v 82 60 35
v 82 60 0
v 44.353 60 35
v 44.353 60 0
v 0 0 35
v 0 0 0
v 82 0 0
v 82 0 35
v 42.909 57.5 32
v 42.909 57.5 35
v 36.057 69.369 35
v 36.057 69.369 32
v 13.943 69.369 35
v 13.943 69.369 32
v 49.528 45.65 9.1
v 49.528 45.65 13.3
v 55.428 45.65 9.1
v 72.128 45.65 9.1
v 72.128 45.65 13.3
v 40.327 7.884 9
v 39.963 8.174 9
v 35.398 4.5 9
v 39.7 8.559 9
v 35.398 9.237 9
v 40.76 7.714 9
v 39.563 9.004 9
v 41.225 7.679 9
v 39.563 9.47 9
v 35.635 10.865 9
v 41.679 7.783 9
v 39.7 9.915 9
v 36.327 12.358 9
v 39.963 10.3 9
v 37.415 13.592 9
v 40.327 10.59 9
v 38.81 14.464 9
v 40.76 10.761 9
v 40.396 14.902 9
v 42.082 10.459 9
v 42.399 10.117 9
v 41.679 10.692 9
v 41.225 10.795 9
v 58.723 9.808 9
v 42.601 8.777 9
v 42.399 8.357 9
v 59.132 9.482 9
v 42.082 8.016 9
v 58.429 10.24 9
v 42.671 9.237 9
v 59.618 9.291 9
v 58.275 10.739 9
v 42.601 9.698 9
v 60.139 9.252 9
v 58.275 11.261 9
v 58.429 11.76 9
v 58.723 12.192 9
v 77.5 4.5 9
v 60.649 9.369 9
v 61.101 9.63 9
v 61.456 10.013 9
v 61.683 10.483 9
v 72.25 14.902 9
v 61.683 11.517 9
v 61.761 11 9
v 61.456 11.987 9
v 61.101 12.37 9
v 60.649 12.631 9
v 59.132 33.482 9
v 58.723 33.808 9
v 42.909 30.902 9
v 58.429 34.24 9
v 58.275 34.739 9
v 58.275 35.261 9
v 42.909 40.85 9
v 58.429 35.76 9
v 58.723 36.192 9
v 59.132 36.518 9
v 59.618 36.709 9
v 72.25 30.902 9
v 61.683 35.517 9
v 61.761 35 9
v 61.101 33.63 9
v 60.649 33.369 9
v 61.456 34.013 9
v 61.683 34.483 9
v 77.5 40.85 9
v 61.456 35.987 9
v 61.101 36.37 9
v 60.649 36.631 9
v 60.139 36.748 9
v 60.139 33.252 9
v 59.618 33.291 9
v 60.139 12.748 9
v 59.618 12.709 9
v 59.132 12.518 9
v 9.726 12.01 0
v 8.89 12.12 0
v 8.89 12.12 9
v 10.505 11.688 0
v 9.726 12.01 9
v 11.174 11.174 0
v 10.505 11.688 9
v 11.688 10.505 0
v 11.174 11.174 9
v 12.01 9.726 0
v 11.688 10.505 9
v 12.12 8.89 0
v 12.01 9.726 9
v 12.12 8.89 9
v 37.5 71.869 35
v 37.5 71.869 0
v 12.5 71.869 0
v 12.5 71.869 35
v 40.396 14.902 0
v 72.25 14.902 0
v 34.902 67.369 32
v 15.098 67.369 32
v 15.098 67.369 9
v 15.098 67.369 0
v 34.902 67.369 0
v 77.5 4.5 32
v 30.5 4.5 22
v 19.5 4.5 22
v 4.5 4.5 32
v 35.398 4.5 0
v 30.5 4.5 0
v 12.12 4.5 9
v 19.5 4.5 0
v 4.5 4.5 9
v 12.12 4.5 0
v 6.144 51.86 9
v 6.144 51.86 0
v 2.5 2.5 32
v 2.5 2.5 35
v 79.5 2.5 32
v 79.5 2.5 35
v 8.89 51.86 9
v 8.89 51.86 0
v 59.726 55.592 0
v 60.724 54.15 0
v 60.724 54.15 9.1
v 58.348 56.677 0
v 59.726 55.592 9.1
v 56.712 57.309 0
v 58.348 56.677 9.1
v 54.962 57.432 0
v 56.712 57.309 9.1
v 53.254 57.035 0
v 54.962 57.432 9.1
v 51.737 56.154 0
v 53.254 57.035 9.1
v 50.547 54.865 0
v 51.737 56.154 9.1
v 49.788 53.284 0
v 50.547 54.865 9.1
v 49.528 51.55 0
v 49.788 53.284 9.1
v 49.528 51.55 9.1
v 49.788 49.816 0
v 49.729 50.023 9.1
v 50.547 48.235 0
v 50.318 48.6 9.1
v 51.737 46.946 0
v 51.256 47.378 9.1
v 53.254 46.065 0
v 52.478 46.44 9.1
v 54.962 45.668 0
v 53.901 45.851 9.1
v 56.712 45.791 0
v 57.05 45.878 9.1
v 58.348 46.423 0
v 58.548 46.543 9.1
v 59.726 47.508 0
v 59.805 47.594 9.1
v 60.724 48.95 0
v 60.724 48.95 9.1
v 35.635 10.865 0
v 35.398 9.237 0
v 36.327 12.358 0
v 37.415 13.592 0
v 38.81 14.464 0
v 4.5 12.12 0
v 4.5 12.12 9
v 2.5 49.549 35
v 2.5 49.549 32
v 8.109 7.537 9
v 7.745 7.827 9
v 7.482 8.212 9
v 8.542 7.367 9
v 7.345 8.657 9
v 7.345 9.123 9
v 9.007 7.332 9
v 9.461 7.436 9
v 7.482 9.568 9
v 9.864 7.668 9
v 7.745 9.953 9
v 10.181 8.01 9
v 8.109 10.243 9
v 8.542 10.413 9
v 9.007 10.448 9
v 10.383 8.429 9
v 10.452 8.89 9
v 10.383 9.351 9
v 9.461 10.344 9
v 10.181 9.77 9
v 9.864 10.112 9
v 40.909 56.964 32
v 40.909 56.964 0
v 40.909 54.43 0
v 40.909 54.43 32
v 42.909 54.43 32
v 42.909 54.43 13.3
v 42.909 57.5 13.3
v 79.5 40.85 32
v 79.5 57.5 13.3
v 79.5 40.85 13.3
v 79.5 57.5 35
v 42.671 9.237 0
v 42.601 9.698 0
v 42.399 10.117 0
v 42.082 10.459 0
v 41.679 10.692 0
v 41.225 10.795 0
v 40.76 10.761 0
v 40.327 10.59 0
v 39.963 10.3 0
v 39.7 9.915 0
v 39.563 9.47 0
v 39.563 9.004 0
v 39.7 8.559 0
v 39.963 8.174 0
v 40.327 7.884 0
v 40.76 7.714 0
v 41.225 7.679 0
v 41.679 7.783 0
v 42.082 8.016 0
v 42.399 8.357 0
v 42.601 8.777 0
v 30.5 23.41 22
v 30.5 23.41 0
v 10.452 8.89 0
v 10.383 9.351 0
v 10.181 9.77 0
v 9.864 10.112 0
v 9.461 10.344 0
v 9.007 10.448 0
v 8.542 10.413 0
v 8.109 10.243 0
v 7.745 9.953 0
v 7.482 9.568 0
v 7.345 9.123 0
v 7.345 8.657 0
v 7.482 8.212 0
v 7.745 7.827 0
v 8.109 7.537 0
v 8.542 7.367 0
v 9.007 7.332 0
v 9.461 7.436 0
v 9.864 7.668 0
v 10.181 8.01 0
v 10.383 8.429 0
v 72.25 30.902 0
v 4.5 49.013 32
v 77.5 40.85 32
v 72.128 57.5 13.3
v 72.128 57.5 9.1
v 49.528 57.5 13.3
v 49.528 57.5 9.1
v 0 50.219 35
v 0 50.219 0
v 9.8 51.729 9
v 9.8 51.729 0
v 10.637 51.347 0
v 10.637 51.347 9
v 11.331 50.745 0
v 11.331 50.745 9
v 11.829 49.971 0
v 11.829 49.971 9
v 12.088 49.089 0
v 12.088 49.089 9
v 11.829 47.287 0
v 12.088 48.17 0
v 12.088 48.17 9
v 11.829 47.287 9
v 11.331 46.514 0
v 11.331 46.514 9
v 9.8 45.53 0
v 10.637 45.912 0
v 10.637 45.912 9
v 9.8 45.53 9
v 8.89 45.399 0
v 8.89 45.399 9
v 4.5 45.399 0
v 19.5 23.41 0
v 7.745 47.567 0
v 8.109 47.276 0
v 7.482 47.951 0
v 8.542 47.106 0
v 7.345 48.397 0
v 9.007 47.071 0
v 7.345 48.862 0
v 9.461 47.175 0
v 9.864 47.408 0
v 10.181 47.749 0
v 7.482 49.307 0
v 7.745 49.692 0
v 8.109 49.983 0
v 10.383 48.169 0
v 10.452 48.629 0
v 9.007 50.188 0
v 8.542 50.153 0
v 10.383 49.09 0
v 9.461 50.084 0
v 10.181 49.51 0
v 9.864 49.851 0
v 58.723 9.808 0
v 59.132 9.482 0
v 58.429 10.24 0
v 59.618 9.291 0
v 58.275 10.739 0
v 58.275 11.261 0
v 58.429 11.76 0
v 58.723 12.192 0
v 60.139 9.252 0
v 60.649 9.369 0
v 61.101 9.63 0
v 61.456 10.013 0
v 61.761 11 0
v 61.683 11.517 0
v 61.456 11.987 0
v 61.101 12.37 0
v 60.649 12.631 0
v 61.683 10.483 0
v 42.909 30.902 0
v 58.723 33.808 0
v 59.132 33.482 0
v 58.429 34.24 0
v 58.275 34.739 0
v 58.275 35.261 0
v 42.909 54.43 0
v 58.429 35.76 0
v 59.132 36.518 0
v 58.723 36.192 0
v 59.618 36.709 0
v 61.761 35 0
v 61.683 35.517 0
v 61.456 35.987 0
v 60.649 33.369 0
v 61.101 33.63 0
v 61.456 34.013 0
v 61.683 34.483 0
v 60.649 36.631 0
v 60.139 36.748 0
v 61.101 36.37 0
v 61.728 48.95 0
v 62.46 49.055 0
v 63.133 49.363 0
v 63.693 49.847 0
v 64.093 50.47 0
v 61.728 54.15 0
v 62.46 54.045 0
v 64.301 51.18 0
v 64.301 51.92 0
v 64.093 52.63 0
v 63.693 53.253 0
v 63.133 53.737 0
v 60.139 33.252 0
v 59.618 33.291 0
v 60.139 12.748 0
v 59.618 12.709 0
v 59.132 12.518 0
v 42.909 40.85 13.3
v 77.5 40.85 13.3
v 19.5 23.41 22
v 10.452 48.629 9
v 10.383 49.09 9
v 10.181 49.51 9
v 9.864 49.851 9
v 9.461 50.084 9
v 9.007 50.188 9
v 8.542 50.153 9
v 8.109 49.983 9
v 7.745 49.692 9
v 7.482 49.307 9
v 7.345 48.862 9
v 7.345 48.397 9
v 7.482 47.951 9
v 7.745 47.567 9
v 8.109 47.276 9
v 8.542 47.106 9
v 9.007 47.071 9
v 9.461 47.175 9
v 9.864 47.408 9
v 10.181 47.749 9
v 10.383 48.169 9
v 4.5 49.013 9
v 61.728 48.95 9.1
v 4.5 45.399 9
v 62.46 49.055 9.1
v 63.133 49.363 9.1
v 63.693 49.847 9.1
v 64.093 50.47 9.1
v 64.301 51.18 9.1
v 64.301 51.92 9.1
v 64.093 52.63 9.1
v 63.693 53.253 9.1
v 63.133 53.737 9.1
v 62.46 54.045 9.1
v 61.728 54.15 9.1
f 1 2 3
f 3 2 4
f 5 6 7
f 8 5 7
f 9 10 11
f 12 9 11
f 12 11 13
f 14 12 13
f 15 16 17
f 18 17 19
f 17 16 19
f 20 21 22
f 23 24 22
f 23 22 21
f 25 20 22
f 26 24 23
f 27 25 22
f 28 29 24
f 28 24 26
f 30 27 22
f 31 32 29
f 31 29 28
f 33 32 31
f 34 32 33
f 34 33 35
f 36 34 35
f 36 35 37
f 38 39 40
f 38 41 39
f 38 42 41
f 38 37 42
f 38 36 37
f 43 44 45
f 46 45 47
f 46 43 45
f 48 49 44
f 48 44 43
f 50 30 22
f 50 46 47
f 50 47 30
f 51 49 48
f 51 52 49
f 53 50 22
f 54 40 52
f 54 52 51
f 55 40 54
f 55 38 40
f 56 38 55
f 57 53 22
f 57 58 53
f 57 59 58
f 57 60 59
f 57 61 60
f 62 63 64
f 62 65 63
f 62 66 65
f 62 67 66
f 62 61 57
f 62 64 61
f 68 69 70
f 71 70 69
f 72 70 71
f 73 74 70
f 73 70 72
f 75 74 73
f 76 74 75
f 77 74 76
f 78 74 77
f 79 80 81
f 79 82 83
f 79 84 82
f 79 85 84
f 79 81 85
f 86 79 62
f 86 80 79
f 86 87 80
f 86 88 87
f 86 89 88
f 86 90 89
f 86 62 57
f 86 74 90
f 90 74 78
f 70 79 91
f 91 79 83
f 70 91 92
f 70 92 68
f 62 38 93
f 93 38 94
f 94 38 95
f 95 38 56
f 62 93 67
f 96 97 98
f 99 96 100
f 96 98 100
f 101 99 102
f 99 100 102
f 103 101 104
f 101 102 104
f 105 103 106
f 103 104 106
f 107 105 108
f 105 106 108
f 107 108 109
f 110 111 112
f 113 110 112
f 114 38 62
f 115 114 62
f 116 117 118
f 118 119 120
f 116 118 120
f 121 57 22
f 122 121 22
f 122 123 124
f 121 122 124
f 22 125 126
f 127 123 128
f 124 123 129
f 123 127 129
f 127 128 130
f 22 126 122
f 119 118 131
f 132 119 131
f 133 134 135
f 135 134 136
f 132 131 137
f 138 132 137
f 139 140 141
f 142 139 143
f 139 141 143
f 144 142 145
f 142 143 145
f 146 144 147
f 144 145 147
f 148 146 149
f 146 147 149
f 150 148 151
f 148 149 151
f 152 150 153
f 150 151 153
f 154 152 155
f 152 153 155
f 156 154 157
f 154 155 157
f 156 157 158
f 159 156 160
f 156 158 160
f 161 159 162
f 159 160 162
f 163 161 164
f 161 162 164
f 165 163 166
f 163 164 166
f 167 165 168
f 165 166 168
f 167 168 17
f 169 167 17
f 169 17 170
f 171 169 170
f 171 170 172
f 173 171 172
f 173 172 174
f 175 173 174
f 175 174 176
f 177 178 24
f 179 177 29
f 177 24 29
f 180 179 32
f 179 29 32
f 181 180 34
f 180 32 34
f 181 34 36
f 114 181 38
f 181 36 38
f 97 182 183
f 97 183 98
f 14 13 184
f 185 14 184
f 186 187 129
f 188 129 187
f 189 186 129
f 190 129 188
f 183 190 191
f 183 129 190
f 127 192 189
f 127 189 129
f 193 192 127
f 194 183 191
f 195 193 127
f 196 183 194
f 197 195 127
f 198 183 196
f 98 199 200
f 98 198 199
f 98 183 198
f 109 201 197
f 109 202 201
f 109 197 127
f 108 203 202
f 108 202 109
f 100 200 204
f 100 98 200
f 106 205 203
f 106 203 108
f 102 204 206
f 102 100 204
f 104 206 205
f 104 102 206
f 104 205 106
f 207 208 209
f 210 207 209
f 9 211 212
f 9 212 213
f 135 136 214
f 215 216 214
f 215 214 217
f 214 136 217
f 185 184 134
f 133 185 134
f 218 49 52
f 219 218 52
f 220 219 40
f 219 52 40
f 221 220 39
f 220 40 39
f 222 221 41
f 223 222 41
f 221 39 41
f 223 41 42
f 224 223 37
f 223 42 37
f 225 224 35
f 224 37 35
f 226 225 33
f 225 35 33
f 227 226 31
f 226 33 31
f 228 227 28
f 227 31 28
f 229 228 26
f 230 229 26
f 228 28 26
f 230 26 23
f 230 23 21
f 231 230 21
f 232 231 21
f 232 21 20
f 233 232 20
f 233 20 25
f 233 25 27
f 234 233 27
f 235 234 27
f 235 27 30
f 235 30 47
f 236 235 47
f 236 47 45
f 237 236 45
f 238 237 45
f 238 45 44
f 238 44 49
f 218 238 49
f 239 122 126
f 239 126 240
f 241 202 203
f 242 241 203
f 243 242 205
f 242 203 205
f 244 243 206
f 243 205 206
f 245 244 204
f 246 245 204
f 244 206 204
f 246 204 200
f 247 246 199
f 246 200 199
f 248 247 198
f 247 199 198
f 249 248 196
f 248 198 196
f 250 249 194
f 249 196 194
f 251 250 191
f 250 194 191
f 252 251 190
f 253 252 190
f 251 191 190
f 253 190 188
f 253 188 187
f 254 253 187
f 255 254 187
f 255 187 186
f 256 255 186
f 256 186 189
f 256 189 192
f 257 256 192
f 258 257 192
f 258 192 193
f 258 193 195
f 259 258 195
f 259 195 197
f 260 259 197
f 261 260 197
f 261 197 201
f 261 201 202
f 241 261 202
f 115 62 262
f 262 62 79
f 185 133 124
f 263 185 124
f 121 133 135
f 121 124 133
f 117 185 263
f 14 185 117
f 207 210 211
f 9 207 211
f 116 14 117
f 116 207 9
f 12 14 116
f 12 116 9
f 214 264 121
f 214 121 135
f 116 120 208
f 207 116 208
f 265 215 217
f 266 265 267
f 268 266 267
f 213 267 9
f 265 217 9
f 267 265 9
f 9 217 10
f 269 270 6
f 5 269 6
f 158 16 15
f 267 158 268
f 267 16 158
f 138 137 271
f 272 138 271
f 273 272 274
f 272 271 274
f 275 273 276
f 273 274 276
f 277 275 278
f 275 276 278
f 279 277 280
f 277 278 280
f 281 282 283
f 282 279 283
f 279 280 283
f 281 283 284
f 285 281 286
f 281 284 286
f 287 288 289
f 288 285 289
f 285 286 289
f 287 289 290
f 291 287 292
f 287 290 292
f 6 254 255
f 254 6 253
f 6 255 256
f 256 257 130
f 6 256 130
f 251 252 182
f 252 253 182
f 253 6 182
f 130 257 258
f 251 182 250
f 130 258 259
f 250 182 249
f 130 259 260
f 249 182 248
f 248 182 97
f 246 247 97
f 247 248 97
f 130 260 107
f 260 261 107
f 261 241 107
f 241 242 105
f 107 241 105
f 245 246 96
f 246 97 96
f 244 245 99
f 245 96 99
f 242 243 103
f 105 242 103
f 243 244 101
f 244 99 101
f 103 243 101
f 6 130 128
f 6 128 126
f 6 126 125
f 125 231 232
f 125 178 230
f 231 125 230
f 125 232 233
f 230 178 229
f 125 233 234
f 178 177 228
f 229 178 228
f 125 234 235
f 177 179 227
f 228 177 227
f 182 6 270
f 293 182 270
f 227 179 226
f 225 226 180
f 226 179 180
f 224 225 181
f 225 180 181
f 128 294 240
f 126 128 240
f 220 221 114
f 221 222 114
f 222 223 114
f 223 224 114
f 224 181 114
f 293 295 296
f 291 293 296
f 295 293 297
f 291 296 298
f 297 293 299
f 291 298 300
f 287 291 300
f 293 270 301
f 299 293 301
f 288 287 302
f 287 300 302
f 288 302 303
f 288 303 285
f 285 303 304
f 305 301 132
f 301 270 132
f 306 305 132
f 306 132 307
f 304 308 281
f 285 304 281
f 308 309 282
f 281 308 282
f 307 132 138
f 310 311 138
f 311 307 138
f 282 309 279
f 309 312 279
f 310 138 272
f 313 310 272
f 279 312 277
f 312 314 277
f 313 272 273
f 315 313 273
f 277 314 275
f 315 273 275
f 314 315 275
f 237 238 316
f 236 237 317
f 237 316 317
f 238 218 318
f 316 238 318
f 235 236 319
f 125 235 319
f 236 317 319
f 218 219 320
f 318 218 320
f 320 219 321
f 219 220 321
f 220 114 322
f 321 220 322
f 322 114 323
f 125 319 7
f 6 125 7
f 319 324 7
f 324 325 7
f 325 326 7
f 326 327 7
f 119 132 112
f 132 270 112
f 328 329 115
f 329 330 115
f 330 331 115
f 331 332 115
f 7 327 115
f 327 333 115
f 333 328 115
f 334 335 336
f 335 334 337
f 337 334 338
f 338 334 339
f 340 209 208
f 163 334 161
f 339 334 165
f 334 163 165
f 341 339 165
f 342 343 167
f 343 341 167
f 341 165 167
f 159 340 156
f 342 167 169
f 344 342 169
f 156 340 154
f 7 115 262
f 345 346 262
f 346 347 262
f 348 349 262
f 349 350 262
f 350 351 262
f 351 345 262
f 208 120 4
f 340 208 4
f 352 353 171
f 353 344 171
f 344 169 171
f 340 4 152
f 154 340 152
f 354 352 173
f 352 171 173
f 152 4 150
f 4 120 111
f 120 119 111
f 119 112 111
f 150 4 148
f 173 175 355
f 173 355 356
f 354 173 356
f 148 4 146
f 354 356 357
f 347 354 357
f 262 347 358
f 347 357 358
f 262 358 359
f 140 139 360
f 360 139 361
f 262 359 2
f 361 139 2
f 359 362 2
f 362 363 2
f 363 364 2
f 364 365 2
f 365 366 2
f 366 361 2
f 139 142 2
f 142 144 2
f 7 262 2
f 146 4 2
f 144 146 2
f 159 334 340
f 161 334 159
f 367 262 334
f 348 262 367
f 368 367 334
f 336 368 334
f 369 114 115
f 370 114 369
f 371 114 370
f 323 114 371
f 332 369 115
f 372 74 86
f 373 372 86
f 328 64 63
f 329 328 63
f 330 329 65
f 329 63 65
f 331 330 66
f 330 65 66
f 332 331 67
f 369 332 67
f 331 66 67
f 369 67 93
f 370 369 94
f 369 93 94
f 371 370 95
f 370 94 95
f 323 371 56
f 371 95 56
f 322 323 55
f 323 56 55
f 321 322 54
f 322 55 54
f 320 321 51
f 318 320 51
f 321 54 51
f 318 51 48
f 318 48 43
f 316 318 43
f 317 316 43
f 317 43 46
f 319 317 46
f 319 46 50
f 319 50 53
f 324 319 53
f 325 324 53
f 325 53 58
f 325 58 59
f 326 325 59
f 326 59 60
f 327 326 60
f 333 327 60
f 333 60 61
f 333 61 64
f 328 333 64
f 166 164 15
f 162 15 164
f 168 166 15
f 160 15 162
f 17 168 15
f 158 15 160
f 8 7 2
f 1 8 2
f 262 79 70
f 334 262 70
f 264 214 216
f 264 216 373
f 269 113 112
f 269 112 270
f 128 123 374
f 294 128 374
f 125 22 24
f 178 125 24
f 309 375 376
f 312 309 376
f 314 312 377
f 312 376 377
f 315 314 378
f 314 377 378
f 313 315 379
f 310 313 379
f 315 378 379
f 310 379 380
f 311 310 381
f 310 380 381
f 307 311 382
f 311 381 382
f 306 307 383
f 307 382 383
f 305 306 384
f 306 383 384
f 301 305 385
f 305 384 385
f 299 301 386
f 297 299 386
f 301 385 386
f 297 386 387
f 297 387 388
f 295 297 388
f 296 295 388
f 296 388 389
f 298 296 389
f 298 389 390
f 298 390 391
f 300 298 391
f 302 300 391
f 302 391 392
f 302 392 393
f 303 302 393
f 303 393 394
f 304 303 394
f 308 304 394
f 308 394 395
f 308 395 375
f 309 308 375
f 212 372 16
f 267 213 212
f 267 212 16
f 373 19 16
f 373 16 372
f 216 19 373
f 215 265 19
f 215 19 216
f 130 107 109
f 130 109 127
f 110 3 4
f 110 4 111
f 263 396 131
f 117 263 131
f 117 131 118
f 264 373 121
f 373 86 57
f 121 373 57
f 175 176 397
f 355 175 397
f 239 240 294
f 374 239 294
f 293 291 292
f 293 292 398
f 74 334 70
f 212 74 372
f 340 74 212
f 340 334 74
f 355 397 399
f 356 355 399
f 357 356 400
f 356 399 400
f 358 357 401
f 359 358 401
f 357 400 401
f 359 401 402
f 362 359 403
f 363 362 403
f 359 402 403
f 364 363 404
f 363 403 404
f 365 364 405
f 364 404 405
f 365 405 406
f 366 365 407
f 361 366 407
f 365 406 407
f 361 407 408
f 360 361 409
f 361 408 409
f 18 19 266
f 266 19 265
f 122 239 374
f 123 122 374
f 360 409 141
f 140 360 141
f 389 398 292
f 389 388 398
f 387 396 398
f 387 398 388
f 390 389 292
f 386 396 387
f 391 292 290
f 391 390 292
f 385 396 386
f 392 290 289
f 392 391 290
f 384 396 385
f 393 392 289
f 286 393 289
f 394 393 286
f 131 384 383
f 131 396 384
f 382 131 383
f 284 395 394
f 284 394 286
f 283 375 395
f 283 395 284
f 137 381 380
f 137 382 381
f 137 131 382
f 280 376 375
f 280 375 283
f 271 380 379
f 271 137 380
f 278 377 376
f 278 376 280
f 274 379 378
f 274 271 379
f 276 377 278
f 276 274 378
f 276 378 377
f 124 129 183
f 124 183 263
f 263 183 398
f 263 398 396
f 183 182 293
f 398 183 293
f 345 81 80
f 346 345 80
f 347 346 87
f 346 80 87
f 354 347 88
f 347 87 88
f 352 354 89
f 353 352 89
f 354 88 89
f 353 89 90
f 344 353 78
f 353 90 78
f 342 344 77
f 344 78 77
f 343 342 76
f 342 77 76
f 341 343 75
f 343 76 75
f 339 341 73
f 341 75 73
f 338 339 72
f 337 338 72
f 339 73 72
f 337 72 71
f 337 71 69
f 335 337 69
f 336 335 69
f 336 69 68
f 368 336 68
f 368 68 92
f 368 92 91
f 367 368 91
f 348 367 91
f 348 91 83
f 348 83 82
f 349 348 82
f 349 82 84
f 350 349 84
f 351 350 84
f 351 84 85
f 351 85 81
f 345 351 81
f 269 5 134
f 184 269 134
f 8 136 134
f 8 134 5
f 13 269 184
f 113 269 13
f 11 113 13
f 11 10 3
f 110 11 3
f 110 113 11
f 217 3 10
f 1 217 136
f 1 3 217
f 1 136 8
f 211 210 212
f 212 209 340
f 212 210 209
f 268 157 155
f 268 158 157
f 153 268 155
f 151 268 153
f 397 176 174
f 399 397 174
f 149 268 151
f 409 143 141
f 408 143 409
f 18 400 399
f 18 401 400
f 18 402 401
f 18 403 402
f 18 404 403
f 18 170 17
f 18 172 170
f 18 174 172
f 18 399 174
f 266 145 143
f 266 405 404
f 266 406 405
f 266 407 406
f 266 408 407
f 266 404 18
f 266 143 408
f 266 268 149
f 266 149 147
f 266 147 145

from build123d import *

# Parameters (mm, degrees)
BOSS_EXTRUDE1_DEPTH = 35
CUT_EXTRUDE1_DEPTH  = 26
SKETCH4_W           = 36.590571665
SKETCH4_H           = 16.65
BOSS_EXTRUDE2_DEPTH = 4.3
SKETCH5_W           = 22.6
SKETCH5_H           = 11.85
CUT_EXTRUDE2_DEPTH  = 4.2
CUT_EXTRUDE3_DEPTH  = 17.2
BOSS_EXTRUDE3_DEPTH = 23
SKETCH11_R          = 1.5625
CUT_EXTRUDE7_DEPTH  = 12.54
SKETCH13_R          = 1.7526
CUT_EXTRUDE8_DEPTH  = 16
SKETCH15_W          = 11
SKETCH15_H          = 18.91
BOSS_EXTRUDE4_DEPTH = 22


with BuildPart() as part:
    # Sketch1 → Boss-Extrude1 (new body)
    with BuildSketch(Plane.XY):
        Polygon((0, 50.21875), (0, 0), (82, 0), (82, 60), (44.352804008, 60), (37.500008496, 71.86939), (12.500002832, 71.86939), align=None)
    extrude(amount=BOSS_EXTRUDE1_DEPTH)

    # Sketch3 → Cut-Extrude1 (cut)
    with BuildSketch(Plane.XY.offset(35)):
        Polygon((42.909428335, 57.5), (36.056632823, 69.36939), (13.943378505, 69.36939), (2.5, 49.548877019), (2.5, 2.5), (79.5, 2.5), (79.5, 57.5), align=None)
    extrude(amount=-CUT_EXTRUDE1_DEPTH, mode=Mode.SUBTRACT)

    # Sketch4 → Boss-Extrude2 (add)
    with BuildSketch(Plane.XY.offset(9)):
        with Locations((61.204714168, 49.175)):
            Rectangle(SKETCH4_W, SKETCH4_H)
    extrude(amount=BOSS_EXTRUDE2_DEPTH)

    # Sketch5 → Cut-Extrude2 (cut)
    with BuildSketch(Plane.XY.offset(13.3)):
        with Locations((60.82763, 51.575)):
            Rectangle(SKETCH5_W, SKETCH5_H)
    extrude(amount=-CUT_EXTRUDE2_DEPTH, mode=Mode.SUBTRACT)

    # Sketch6 → Cut-Extrude3 (cut)
    with BuildSketch(Plane.XY.offset(9.1)):
        with BuildLine():
            Line((61.72763, 54.15), (60.723855071, 54.15))
            ThreePointArc((60.723855071, 54.15), (49.52763, 51.55), (60.723855071, 48.95))
            Line((60.723855071, 48.95), (61.72763, 48.95))
            ThreePointArc((61.72763, 48.95), (64.32763, 51.55), (61.72763, 54.15))
        make_face()
    extrude(amount=-CUT_EXTRUDE3_DEPTH, mode=Mode.SUBTRACT)

    # Sketch7 → Boss-Extrude3 (add)
    with BuildSketch(Plane.XY.offset(9)):
        Polygon((40.909428335, 56.964101615), (40.909428335, 54.429795973), (42.909428335, 54.429795973), (42.909428335, 57.5), (36.056632823, 69.36939), (13.943378505, 69.36939), (2.5, 49.548877019), (2.5, 2.5), (79.5, 2.5), (79.5, 40.85), (77.5, 40.85), (77.5, 4.5), (4.5, 4.5), (4.5, 49.012978634), (15.098079043, 67.36939), (34.901932285, 67.36939), align=None)
    extrude(amount=BOSS_EXTRUDE3_DEPTH)

    # Sketch11 → Cut-Extrude7 (cut)
    with BuildSketch(Plane.XY.offset(9)):
        with BuildLine():
            Line((6.14367659, 51.85991), (8.89, 51.85991))
            ThreePointArc((8.89, 51.85991), (12.1205, 48.62941), (8.89, 45.39891))
            Line((8.89, 45.39891), (4.5, 45.39891))
            Line((4.5, 45.39891), (4.5, 12.1205))
            Line((4.5, 12.1205), (8.89, 12.1205))
            ThreePointArc((8.89, 12.1205), (11.174308457, 11.174308457), (12.1205, 8.89))
            Line((12.1205, 8.89), (12.1205, 4.5))
            Line((12.1205, 4.5), (35.398460219, 4.5))
            Line((35.398460219, 4.5), (35.398460219, 9.237253753))
            ThreePointArc((35.398460219, 9.237253753), (36.826407652, 13.014445691), (40.396010976, 14.90234))
            Line((40.396010976, 14.90234), (72.25, 14.90234))
            Line((72.25, 14.90234), (72.25, 30.90234))
            Line((72.25, 30.90234), (42.909428335, 30.90234))
            Line((42.909428335, 30.90234), (42.909428335, 54.429795973))
            Line((42.909428335, 54.429795973), (40.909428335, 54.429795973))
            Line((40.909428335, 54.429795973), (40.909428335, 56.964101615))
            Line((40.909428335, 56.964101615), (34.901932285, 67.36939))
            Line((34.901932285, 67.36939), (15.098079043, 67.36939))
            Line((15.098079043, 67.36939), (6.14367659, 51.85991))
        make_face()
        with Locations((8.89, 8.89)):
            Circle(SKETCH11_R)
        with Locations((8.89, 48.62941)):
            Circle(SKETCH11_R)
        with Locations((41.108128667, 9.237253753)):
            Circle(SKETCH11_R)
    extrude(amount=-CUT_EXTRUDE7_DEPTH, mode=Mode.SUBTRACT)

    # Sketch13 → Cut-Extrude8 (cut)
    with BuildSketch(Plane.XY.offset(9)):
        with Locations((60.00821, 11)):
            Circle(SKETCH13_R)
        with Locations((60.00821, 35)):
            Circle(SKETCH13_R)
    extrude(amount=-CUT_EXTRUDE8_DEPTH, mode=Mode.SUBTRACT)

    # Sketch15 → Boss-Extrude4 (add)
    with BuildSketch(Plane(origin=(0, 0, 0), x_dir=(-1, 0, 0), z_dir=(0, 0, -1))):
        with Locations((-25, 13.955)):
            Rectangle(SKETCH15_W, SKETCH15_H)
    extrude(amount=-BOSS_EXTRUDE4_DEPTH)


solid = part.part
